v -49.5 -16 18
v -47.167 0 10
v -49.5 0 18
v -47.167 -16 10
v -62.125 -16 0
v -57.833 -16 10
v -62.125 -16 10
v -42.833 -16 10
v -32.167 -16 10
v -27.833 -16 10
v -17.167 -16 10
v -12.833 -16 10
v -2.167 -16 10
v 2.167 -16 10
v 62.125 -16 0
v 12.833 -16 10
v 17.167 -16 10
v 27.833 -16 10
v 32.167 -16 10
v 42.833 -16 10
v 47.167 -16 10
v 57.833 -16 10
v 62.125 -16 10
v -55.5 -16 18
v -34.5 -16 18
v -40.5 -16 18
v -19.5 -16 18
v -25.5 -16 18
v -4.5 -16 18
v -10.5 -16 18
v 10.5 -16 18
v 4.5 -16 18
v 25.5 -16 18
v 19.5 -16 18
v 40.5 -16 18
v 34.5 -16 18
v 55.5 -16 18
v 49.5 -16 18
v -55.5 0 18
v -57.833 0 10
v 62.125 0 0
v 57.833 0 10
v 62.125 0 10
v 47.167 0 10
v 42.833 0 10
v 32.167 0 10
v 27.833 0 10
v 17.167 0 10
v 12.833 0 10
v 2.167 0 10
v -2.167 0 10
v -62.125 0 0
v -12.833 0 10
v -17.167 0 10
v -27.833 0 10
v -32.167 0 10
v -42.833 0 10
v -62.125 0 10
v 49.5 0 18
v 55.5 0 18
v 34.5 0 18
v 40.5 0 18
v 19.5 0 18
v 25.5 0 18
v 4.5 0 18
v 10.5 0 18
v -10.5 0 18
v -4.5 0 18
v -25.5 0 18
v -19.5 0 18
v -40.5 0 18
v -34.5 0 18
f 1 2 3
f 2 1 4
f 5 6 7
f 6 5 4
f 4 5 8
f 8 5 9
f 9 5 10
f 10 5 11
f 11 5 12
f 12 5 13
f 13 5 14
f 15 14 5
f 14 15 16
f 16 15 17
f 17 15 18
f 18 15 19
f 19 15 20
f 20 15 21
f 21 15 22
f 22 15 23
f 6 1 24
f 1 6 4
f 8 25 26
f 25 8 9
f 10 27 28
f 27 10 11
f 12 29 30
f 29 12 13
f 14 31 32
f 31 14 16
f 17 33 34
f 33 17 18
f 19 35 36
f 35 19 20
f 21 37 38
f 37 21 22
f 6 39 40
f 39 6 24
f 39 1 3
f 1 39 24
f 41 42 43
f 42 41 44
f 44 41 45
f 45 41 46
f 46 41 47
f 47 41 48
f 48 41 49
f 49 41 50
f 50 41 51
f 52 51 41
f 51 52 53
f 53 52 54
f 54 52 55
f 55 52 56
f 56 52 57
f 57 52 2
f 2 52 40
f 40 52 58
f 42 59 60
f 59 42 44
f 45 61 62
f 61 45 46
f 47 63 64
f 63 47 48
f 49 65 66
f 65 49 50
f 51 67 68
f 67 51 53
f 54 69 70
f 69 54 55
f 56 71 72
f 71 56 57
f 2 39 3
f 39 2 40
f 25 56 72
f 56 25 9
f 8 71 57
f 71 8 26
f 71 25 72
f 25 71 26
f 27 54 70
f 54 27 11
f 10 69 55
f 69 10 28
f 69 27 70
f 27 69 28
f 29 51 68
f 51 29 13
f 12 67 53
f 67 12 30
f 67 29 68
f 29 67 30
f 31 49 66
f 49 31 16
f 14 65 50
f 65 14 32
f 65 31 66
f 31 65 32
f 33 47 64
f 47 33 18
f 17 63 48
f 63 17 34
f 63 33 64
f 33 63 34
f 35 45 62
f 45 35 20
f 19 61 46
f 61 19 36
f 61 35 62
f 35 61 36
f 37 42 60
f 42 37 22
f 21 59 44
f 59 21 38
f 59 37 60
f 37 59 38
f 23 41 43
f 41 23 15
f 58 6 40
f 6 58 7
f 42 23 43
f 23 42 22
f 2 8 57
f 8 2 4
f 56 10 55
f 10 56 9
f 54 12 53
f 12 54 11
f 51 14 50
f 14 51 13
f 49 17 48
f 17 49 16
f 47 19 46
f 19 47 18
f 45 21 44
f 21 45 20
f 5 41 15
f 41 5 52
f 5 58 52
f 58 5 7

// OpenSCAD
$fn = 32;

// ----------------------------------------------------------------------
// Toothed rack, 8 teeth
// 15 mm pitch, 8 mm teeth
// ----------------------------------------------------------------------

// --- parameters (mm) ---
bar_w = 16;      // bar width (Y)
bar_h = 10;      // bar height (Z)
teeth = 8;       // number of teeth
pitch = 15;      // tooth pitch
tooth_h = 8;     // tooth height above the bar
root_w = 11.25;  // tooth width at the root
crest_w = 6;     // tooth width at the crest

// --- derived feature positions (mm) ---
span = (teeth - 1) * pitch;  // = 105   distance between the outer teeth
bar_l = span + root_w + 8;   // = 124.25   bar length: teeth plus 4 mm at each end
tooth_x = -span / 2;         // = -52.5   X of the first tooth
height = bar_h + tooth_h;    // = 18   overall height
feature_centers = [
  [tooth_x + 0 * pitch, -bar_w / 2],
  [tooth_x + 1 * pitch, -bar_w / 2],
  [tooth_x + 2 * pitch, -bar_w / 2],
  [tooth_x + 3 * pitch, -bar_w / 2],
  [tooth_x + 4 * pitch, -bar_w / 2],
  [tooth_x + 5 * pitch, -bar_w / 2],
  [tooth_x + 6 * pitch, -bar_w / 2],
  [tooth_x + 7 * pitch, -bar_w / 2]
];   // tooth centre line, drives the tooth loop

// bar with a rack of teeth, one extruded trapezoium per centre
module rack_tooth() {
  linear_extrude(height = bar_w)
    polygon(points = [
      [0, 0],
      [root_w, 0],
      [root_w / 2 + crest_w / 2, tooth_h + 1],
      [root_w / 2 - crest_w / 2, tooth_h + 1]
    ]);
}

union() {
  translate([-bar_l / 2, -bar_w, 0]) cube([bar_l, bar_w, bar_h]);
  for (centre = feature_centers)
    translate([centre[0] - root_w / 2, 0, bar_h - 1]) rotate([90, 0, 0]) rack_tooth();
}
